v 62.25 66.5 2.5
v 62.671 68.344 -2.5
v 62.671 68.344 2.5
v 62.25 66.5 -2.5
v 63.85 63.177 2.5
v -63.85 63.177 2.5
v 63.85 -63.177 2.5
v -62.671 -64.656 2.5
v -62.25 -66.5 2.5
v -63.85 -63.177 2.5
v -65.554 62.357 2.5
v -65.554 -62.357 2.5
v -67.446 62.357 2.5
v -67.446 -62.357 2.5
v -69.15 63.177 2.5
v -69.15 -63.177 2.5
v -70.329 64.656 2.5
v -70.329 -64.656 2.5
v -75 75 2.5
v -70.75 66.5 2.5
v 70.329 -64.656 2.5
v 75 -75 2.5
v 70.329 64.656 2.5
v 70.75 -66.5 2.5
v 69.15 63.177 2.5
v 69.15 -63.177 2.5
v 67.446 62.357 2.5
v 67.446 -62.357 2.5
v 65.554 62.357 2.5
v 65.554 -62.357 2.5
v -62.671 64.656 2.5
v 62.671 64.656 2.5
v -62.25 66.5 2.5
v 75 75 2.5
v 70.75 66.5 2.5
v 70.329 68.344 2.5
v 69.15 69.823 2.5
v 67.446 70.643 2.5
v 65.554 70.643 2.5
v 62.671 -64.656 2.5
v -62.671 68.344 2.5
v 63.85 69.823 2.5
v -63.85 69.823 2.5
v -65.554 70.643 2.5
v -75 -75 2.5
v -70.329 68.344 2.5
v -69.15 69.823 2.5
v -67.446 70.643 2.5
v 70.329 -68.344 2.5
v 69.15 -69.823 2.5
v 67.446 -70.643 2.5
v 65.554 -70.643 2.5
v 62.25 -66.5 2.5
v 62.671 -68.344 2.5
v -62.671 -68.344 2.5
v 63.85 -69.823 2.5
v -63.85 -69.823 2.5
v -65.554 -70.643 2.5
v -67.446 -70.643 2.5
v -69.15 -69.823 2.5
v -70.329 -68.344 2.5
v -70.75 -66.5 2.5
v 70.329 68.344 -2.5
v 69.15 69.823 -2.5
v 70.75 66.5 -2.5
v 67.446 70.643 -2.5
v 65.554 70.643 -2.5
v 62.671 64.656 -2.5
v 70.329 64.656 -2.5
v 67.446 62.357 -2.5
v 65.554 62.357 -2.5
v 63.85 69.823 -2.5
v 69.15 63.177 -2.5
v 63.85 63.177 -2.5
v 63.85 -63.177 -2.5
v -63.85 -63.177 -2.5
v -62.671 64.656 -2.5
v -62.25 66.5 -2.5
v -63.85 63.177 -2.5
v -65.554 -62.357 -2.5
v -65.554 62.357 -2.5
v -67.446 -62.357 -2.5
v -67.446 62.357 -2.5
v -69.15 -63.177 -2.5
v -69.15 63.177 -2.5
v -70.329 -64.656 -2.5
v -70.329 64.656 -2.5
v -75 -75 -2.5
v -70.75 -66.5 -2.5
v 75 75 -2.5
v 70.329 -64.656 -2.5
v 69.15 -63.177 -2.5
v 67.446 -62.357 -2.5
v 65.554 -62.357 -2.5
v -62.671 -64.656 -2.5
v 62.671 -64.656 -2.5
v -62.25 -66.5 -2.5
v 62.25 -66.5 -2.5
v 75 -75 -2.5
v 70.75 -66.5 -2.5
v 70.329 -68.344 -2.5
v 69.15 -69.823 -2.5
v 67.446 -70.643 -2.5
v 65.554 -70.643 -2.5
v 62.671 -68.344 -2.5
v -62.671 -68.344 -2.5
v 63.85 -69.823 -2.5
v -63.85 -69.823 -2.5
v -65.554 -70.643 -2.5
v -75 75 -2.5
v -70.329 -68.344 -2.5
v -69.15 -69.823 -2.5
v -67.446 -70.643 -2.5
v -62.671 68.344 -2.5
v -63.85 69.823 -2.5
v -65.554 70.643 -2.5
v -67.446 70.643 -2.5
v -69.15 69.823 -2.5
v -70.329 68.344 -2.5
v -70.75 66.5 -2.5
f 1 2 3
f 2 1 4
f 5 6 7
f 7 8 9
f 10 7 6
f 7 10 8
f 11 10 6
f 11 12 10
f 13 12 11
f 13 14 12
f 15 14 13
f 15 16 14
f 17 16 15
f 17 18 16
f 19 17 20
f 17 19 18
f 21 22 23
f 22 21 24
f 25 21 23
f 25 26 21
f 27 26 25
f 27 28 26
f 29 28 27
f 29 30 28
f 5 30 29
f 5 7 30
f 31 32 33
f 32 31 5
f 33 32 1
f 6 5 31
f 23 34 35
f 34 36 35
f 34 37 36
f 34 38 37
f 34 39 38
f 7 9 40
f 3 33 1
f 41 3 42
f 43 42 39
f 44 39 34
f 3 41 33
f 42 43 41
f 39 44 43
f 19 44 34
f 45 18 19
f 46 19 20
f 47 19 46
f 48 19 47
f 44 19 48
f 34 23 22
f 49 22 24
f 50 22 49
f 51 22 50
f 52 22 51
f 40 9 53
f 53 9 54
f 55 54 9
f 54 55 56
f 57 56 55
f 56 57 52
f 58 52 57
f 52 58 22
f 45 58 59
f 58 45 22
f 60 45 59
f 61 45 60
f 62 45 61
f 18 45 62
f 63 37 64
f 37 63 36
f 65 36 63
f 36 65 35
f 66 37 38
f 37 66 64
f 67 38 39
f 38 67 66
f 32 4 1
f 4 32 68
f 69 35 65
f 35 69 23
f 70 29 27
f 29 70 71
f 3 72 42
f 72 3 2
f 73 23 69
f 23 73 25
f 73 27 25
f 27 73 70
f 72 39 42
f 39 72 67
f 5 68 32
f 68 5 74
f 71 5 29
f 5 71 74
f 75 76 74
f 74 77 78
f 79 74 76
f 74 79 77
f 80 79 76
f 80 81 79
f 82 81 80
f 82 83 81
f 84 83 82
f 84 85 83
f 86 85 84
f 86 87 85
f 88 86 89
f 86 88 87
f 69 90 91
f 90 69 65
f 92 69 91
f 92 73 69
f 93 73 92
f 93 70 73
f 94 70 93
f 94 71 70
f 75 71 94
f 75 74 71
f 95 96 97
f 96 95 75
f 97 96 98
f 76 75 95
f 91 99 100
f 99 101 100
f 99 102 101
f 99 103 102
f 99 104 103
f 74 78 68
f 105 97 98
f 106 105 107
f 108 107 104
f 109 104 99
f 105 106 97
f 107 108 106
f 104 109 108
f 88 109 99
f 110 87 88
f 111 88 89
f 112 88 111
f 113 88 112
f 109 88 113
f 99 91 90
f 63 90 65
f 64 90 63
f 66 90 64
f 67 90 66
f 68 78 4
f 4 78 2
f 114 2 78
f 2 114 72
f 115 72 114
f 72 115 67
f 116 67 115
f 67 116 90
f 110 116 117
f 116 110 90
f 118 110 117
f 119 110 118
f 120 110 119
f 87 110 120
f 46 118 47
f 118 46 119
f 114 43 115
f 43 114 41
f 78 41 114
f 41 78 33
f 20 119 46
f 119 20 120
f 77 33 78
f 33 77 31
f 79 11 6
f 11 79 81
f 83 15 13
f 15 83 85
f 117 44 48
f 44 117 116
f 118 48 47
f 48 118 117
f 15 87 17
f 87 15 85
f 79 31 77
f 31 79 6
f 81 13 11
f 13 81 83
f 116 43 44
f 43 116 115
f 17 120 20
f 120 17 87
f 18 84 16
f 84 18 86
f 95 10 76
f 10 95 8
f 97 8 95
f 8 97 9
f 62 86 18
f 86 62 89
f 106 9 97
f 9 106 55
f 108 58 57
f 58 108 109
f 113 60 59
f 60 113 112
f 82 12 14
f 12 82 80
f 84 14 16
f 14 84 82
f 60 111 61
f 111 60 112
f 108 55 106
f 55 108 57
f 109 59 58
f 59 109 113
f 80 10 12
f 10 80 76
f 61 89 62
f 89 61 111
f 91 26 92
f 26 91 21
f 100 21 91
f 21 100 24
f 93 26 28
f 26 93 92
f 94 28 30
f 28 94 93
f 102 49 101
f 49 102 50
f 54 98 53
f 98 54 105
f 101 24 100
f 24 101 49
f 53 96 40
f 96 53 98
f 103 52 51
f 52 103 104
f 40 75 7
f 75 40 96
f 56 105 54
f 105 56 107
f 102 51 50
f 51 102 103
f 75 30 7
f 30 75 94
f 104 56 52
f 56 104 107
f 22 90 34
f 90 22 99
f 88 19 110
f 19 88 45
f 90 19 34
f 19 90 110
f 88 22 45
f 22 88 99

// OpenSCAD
// Generated by SolidPython 1.1.3 on 2024-06-19 00:59:38


difference() {
	cube(center = true, size = [150, 150, 5]);
	union() {
		translate(v = [66.5000000000, 66.5000000000]) {
			cylinder(center = true, h = 5, r = 4.2500000000);
		}
		translate(v = [-66.5000000000, 66.5000000000]) {
			cylinder(center = true, h = 5, r = 4.2500000000);
		}
		translate(v = [-66.5000000000, -66.5000000000]) {
			cylinder(center = true, h = 5, r = 4.2500000000);
		}
		translate(v = [66.5000000000, -66.5000000000]) {
			cylinder(center = true, h = 5, r = 4.2500000000);
		}
	}
}
/***********************************************
*********      SolidPython code:      **********
************************************************
 
import solid
import numpy as np
import numbers
import pudb
from solid.utils import *
import viewscad
import subprocess
import os
import os.path as osp
import math
import sys

chamfer_extrude=solid.import_scad("./chamfer_extrude.scad")
chamfer_extrude=chamfer_extrude.chamfer_extrude
r = viewscad.Renderer(width=800, height=800)

def debug(model,f_name,path="/home/ts/code/projects/mfd/designs/debug"):
    solid.scad_render_to_file(model,osp.join(path,f_name)+".scad")
#generate position list of wells using offset from center
wells_pos_from_center_4 = lambda offset: [[-offset,offset],
                                        [offset, offset],
                                        [-offset, -offset],
                                        [offset, -offset]]
wells_pos_from_center_2 = lambda offset: [[offset,0],
                                        [-offset,0]]

def make_well(dims,shape=None,height=None,dxf=False):
    def circle_cylinder():
        if dxf or (height is None):
            well = solid.circle(r=dims, segments=64)
        else:
            well = solid.cylinder(r=dims, h=height, segments=64, center = True)
        return well
    if dims is None:
        sys.exit("radius needs to be a number")
    if isinstance(dims, numbers.Number):
        well =circle_cylinder()
    elif len(dims)==1:
        if isinstance(dims[1], numbers.Number):
            well =circle_cylinder()
        else:
            sys.exit("radius needs to be a number")
    elif len(dims)==2:
        well = solid.square(dims,center = True)
    elif len(dims)==3:
        well = solid.cube(dims, center = True)
    return well

def wells_top_bottom(center_gap,device_dims=None,shape=None,height=None, positions = None, dxf = False,well_shape=None):
    if well_shape == None:
        well_shape = make_well(device_dims,shape=shape,height=height,dxf=dxf)
    wells = []
    if positions is None:
        offset = radius+radius/2.0
        positions = wells_pos_from_center_2(offset)
    if dxf or (height is None):
        height = 0
    for position in positions:
        if dxf:
            wells.append(solid.translate([position[0],position[1]])(well_shape))
        else:
            wells.append(solid.translate([position[0],position[1],height/2.0])(well_shape))
    return  union()(*wells)

#place wells in four corners 
def four_corner(radius,height=None, positions = None, dxf = False):
    #if well pos not specified set
    #to equally spaced by half radius
    if positions is None:
        offset = radius+radius/2.0
        positions = wells_pos_from_center_4(offset)
    if dxf or (height is None):
        height = 0
    #make wells at positions with specified radius and height
    wells = []
    for position in positions:
        #make circle if making dxf
        if dxf:
            well_shape = solid.circle(r=radius, segments=64)
            well_shape = solid.translate([position[0],position[1]])(well_shape)
        #if stl make cylinder
        else:
            well_shape = solid.cylinder(r=radius, h=height, segments=64, center = True)
            well_shape = solid.translate([position[0],position[1],height/2.0])(well_shape)
        wells.append(well_shape)
    return  union()(*wells)

#generate channels 
def make_channels(length,width,height=0,num_chans=1,max_chans=None,spacing=None, dxf = False,
                  rotate_channels=False):
    if dxf or (height is None):
        height = 0
    #if channel gap not defined, is equal to
    if spacing is None: spacing = width
    #calculate number of channels if fitting max num within given width
    if not max_chans is None:
        import math
        num_chans = math.floor((max_chans-spacing)/(width+spacing))
    #get total width of channel section  
    total_width = (width*num_chans)+(spacing*(num_chans-1))

    #make template channel
    #if rotate_channels: width, length = length, width
    if dxf:
        channel_t = solid.square([length,width],center = True)
    else:
        channel_t = solid.cube([length,width,height], center = True)

    #if number channels is even, offset the first channel to center its gap
    if num_chans % 2 == 0: centering = -(width/2.0+spacing/2.0)
    else: centering = 0
    #move template channel up to align bottom at z = 0 
    #and offset center if necessary
    if dxf:
        channel_t = solid.translate([0,centering])(channel_t)
    else:
        channel_t = solid.translate([0,centering,height/2.0])(channel_t)

    #if rotate_channels: length,width = width,length
    #start making the channels
    channels = []
    for i in range(num_chans):
        #if i=0 there is no translation
        #if i=1, we make the first channel adjacent to second
        direction = i

        #if i>=1, we add channels alternating left and right
        if i >= 1:
            direction = -(i/2.0)
            if i % 2 == 1: direction = (-direction)+0.5
                
        #make channel at right position and add it to channel list
        translation_coords = [0,direction*(width+spacing)]
        #if rotate_channels: translation_coords = [direction*(width+spacing),0]
        if dxf:
            channel = solid.translate(translation_coords)(channel_t)
        else:
            channel = solid.translate([*translation_coords,0])(channel_t)
        channels.append(channel)
    
    #group all channels as one object
    channels = union()(*channels)
    #compute the x,y,z dimensions in order to pass as arguments 
    #for construction of other parts of device (such as the chambers)
    measurements = {'x':(length/2.0,-length/2.0),
                    'y':(total_width/2.0,-total_width/2.0)}
    if not dxf:
        measurements['z'] = (height,0)
    if rotate_channels:
        channels = solid.rotate(90)(channels)
        measurements['x'],measurements['y']=measurements['y'],measurements['x']
    return channels,measurements

def make_chambers(msrs,height=None,extra=0,len_until=None,width=None, dxf = False):
    #computes x,y,z length
    total = lambda x : abs(x[0]) + abs(x[1])
    
    #if specific height if specified
    #otherwise use same height as channels
    if dxf:
        pass
    elif not height is None:
        msrs['z'] = (height,0)
    else:
        msrs['z'] = (0,0)
        
    #make copy of measurements from channels to modify chamber dimensions 
    #and add length to chambers as specified
    chamber_dims = msrs.copy()
    #calculate length of chamber to reach specified offset
    if not len_until is None:
        chamber_len = len_until-(msrs['x'][0])
    #or add specified length to channel length (if not specified, adds 0)
    else:
        chamber_len = msrs['x'][0]+extra
    #set the chamber length based 
    chamber_dims['x'] = (chamber_len/2.0,-(chamber_len/2.0))
    #compute final dimensions of chamber
    if not width is None:
        chamber_dims['y'] = (width/2.0,-width/2.0)
    chamber_dims = [total(size) for size in chamber_dims.values()]
        
    #calculate chamber translation offset to place adjacent to channels
    chamber_trslt = msrs['x'][0]+(chamber_len/2.0)
    #compute chamber translation coordinates to align with channels
    #x = 1 moves chamber above channels
    #x = -1 moves chamber below channels
    if dxf:
        trslt = lambda x : [x*(chamber_trslt),0]
    else:
        trslt = lambda x : [x*(chamber_trslt),0,msrs['z'][0]/2.0]
    
    #function to make chamber at top or at bottom 
    if dxf:
        move = lambda x : solid.translate(trslt(x))(solid.square(chamber_dims, center = True) )
    else:
        move = lambda x : solid.translate(trslt(x))(solid.cube(chamber_dims,center = True))
    #make top and bottom chambers and return them as grouped
    top = move(1)
    bottom = move(-1)
    #chambers=solid.rotate(90)(solid.union()(top,bottom))
    chambers=(solid.union()(top,bottom))

    return chambers

#create alignment features 
def alignment_features(unit,dims,grid_size, mask_size = None, alignment = "hollow", units_from_center = (2.5,2.5), corner_len=None):
    width = grid_size[0]*dims[0]
    length = grid_size[1]*dims[1]
    if mask_size is None and corner_len is None:
        corner_len = (dims[0] + dims[1]) /2 / 8
    corner = lambda thickness_div : solid.union()( solid.square([corner_len,corner_len/thickness_div],center=False), solid.square([corner_len/thickness_div,corner_len],center=False) )
    
    def make_full(thickness_div):
        thickness = corner_len/thickness_div
        tr = solid.translate([0, 0, 0 ])(solid.rotate(180)(corner(thickness_div)))
        tr = solid.translate([thickness/2,thickness/2,0])(tr)
        bl = solid.translate([0, 0, 0 ])(solid.rotate(0)(corner(thickness_div)))
        bl = solid.translate([-thickness/2,-thickness/2,0])(bl)
        return solid.union()(tr,bl)
    
    def make_hollow(thickness_div):
        thickness = corner_len/(thickness_div/2)
        inner = make_full(thickness_div)
        outer = make_full(thickness_div/2)
        hollow = outer - inner 
        return hollow
    
    center = (width /2 , length/2)
    mask_pos = lambda x,y : (center[0] + x*(float(units_from_center[0])*dims[0]), center[1] + y*(float(units_from_center[1])*dims[1]))
    positions = []
    positions.append(mask_pos(1,0))
    positions.append(mask_pos(0,1))
    positions.append(mask_pos(-1,0))
    positions.append(mask_pos(0,-1))
    make_mask = lambda mtype : make_hollow(8) if mtype == "hollow" else make_full(8)
    masks = [ solid.translate([*position,0])(make_mask(alignment)) for position in positions]
    
    solid.scad_render_to_file(solid.union()(*masks),"./designs/open_chamber/masks.scad")
    #return unit - solid.union()(*masks)
    return solid.union()(*masks,unit)

def create_outline(thickness, array, dims, grid_size,):
    width = grid_size[0]*dims[0] + thickness *2
    length = grid_size[1]*dims[1] + thickness *2
    outer = solid.translate([-thickness, -thickness,0])(solid.square([width, length]))
    return outer-array

def create_wall(wall_thickness, outline_thickness, dims, grid_size, wall_height = 2000, dxf = False):
    inner_width = grid_size[0]*dims[0] + outline_thickness *2
    inner_length = grid_size[1]*dims[1] + outline_thickness *2
    outer_width = inner_width + wall_thickness * 2
    outer_length = inner_length + wall_thickness * 2
    outer_pos_x = -outline_thickness-wall_thickness
    outer_pos_y = -outline_thickness-wall_thickness
    inner_pos_x = -outline_thickness
    inner_pos_y = -outline_thickness
    if dxf:
        inner_wall = solid.translate([inner_pos_x,
                                      inner_pos_y,
                                      0])(solid.square([inner_width, inner_length]))
        outer_wall = solid.translate([outer_pos_x,
                                      outer_pos_y,
                                      0])(solid.square([outer_width, outer_length]))

        return outer_wall-inner_wall
    else:
        inner_wall = solid.translate([inner_pos_x,
                                      inner_pos_y,
                                      0])(solid.cube([inner_width, inner_length,wall_height]))
        outer_wall = solid.translate([outer_pos_x,
                                      outer_pos_y,
                                      0])(solid.cube([outer_width, outer_length,wall_height]))

        return outer_wall-inner_wall, {'wall_height': wall_height,
                                       'wall_thickness': wall_thickness,
                                       'inner_width':inner_width,
                                       'inner_length': inner_length,
                                       'outer_width': outer_width,
                                       'outer_length': outer_length,
                                       'outer_pos_x' : outer_pos_x,
                                       'outer_pos_y' : outer_pos_y,
                                       'inner_pos_x' : inner_pos_x,
                                       'inner_pos_y' : inner_pos_y}

def create_thicker_wall(wall_thickness, outer_wall_offset, wall_dims, dims, grid_size, height_start = .2, height_end=2, dxf = False):
    addon_wall,thicker_wall_dims = create_wall(wall_thickness, outer_wall_offset, dims, grid_size, wall_height=height_end-height_start, dxf = False)
    addon_wall = solid.translate([0,0,height_start])(addon_wall)

    thicker_wall_dims['wall_height'] = height_end
    thicker_wall_dims['wall_thickness'] = wall_dims['wall_thickness'] + wall_thickness
    return addon_wall, thicker_wall_dims
 
def add_lock_to_wall(wall,wall_dims,y_offset = 0,cut_ratio=0.7,L_length=3, gap_ratio=0.05, axis="x",width_ratio=1/2):
    # Makes L shape
    def make_L(max_length,length_thickness,max_width,width_thickness,height,y_offset):
        length = solid.cube([max_length,length_thickness,height])
        width = solid.cube([width_thickness,max_width,height])
        width = solid.translate([max_length-(width_thickness),0,0])(width)
        L = solid.union()(width,length)
        debug(L,"L")
        if axis == "x":
            L = solid.rotate(-90)(L)
            L = solid.translate([0,max_length,0])(L)
        else:
            L = solid.rotate(-180)(L)
            L = solid.translate([max_length,max_width,0])(L)
        return solid.translate([0,0,y_offset])(L)
    
    lock_length = L_length
    lock_width = wall_dims['wall_thickness']*width_ratio
    lock_length_thickness = lock_width/2
    lock_width_thickness = lock_width/2
    L_lock = make_L(lock_length,lock_length_thickness,lock_width,lock_width_thickness, wall_dims['wall_height']-y_offset, y_offset)
    
    margin_space = lock_length - lock_length*(1-gap_ratio)
    key_length = lock_length-margin_space
    key_length_thickness = lock_length_thickness-(margin_space*2)
    key_width = lock_width-(margin_space*2)
    key_width_thickness = lock_width_thickness-(margin_space*2)
    L_key = make_L(key_length,key_length_thickness,key_width,key_width_thickness, wall_dims['wall_height']-y_offset, y_offset)
    L_key = solid.translate([margin_space,margin_space,0])(L_key)
    L = solid.union()(L_lock,L_key)
    debug(L,"L")
    
    #Make cube to be used as negative to split frame in a half
    #Can choose if making left or right negative, specify ratio of split
    def make_negative(right,cut_ratio):
        if axis == "x":
            if right:
                length = wall_dims['outer_length']*(1-cut_ratio)
                pos_x = wall_dims['outer_pos_x']+(wall_dims['outer_length']*cut_ratio)
            else:
                length = wall_dims['outer_length']*(cut_ratio)
                pos_x = wall_dims['outer_pos_x'] 
            negative = solid.cube([wall_dims['outer_width'],length, wall_dims['wall_height']])
            negative = solid.translate([wall_dims['outer_pos_y'],pos_x,0])(negative)
        else:
            if right:
                length = wall_dims['outer_width']*(1-cut_ratio)
                pos_x = wall_dims['outer_pos_y']+(wall_dims['outer_width']*cut_ratio)
            else:
                length = wall_dims['outer_width']*(cut_ratio)
                pos_x = wall_dims['outer_pos_y'] 
            negative = solid.cube([length,wall_dims['outer_length'], wall_dims['wall_height']])
            negative = solid.translate([pos_x,wall_dims['outer_pos_x'],0])(negative)
        return negative, pos_x, length 
                      
    #Make negatives
    negative_right, right_half_pos_x, right_half_length = make_negative(True,cut_ratio)
    negative_left, left_half_pos_x, right_half_length = make_negative(False,cut_ratio)
    #Make halves
    left_half = solid.difference()(wall,negative_right)
    right_half = solid.difference()(wall,negative_left)
    def place_L(L, L_length,L_width):
        #Place L on top wall       
        offset_to_center = (wall_dims['wall_thickness']-L_width)/2
        if axis == "x":
            y_pos_top = (wall_dims['outer_pos_y'] +
                    wall_dims['outer_width'] - 
                    L_width - offset_to_center)
            top_L = solid.translate([y_pos_top,
                                     right_half_pos_x-(L_length),
                                     0])(L)
            #Place L on bottom wall       
            y_pos_bottom = wall_dims['outer_pos_y']+offset_to_center
            bottom_L = solid.translate([y_pos_bottom,
                                        right_half_pos_x-L_length,
                                        0])(L)
        else:
            y_pos_top = (wall_dims['outer_pos_x'] +
                    wall_dims['outer_length'] -
                    (L_width+offset_to_center))
            top_L = solid.translate([right_half_pos_x-L_length,
                                     y_pos_top,
                                     0])(L)
            #Place L on bottom wall       
            y_pos_bottom = wall_dims['outer_pos_y']+offset_to_center
            bottom_L = solid.translate([right_half_pos_x-L_length,
                                        y_pos_bottom,
                                        0])(L)
        return bottom_L, top_L
    #Make complimentary L pieces through union and differences
    #Make Lock
    bottom_L_lock, top_L_lock = place_L(L_lock,L_length,lock_width)
    left_half = solid.difference()(left_half,bottom_L_lock)
    left_half = solid.difference()(left_half,top_L_lock)
    #Make Key
    bottom_L_key, top_L_key = place_L(L_key,L_length,lock_width)
    right_half = solid.union()(right_half,bottom_L_key)
    right_half = solid.union()(right_half,top_L_key)
    return left_half, right_half


#build a row x col grid of containment units
def make_unit_array(unit,dims,grid_size, dxf = False, alignment = None, mask_size = None,
                    units_from_center = None,alignment_offset=None, alignment_mark_size=1):
    units = []
    for col in range(grid_size[1]):
        for row in range(grid_size[0]):
            if dxf:
                units.append(solid.translate([row*dims[0],col*dims[1]])(unit))
            else:
                units.append(solid.translate([row*dims[0],col*dims[1],dims[2]/2.0])(unit))
    array = solid.union()(*units)
    if (not alignment is None) and dxf:
        if not alignment_offset is None:
            array = solid.translate([alignment_offset[0],alignment_offset[1]])(array)
        array = alignment_features(array,dims, grid_size, alignment = alignment, mask_size = None, units_from_center = units_from_center,corner_len=alignment_mark_size)
        if not alignment_offset is None:
            array = solid.translate([-alignment_offset[0],-alignment_offset[1]])(array)
    return array


def make_taylor(wells_pos = wells_pos_from_center_4(2.25), well_rad = 1.5 ,
                well_height = 2, chan_w = 0.01, chan_l = 1, chan_h = 0.010 ,
                chan_gap = 0.040, max_chans = None,num_chans=100, chamber_height  = 0.100,
                columns = 1, rows = 1, chamber_len_until=2.25, add_channels = True, add_wells = True, 
                add_chambers = True, save_path = "./", alignment = None, units_from_center = 2,
                mask_size = None, render_stl = False, outline_thickness = 0.050, dxf = True,
                wall_height = 15, wall_thickness = 0.95, casing_x=9, casing_y=9, casing_z=0,rotate_units=0):

    dims = [casing_x, casing_y, casing_z]
    wells = four_corner(well_rad,well_height, dxf = dxf, positions = wells_pos)
    debug(wells,"wells")
    channels, msrs = make_channels(chan_l,chan_w,chan_h,dxf=dxf, spacing = chan_gap, max_chans=max_chans,num_chans=num_chans)
    debug(channels,"channels")
    chambers = make_chambers(msrs,dxf = dxf, height=chamber_height,len_until=chamber_len_until)
    debug(chambers,"chambers")

    #add together and render
    device_parts = []
    if add_channels:
        device_parts.append(channels)
    if add_wells:
        device_parts.append(wells)
    if add_chambers:
        device_parts.append(chambers)
    device=union()(*device_parts)
    device = rotate(rotate_units)(device)

    device=solid.translate([dims[0]/2.0,dims[1]/2.0,0])(device)
    channels = rotate(rotate_units)(channels)
    channels=solid.translate([dims[0]/2,dims[1]/2,0])(channels)
    chambers_wells = union()(wells,chambers)
    chambers_wells = rotate(rotate_units)(chambers_wells)
    chambers_wells=solid.translate([dims[0]/2,dims[1]/2,0])(chambers_wells)

    file_name = str(rows)+'x'+str(columns)+'_units_'
    grid_size = [rows,columns]

    if alignment:
        alignment="full"
    device = make_unit_array(device,dims,grid_size, dxf=dxf, alignment = alignment,
                                 units_from_center = units_from_center)
    channels = make_unit_array(channels,dims,grid_size, dxf=dxf, alignment = alignment,
                                 units_from_center = units_from_center)
    if alignment=="full":
        alignment="hollow"

    chambers_wells = make_unit_array(chambers_wells,dims,grid_size, dxf=dxf, alignment = alignment,
                                 units_from_center =units_from_center)

    def save_model(model,prefix):
        model_fname = os.path.abspath(save_path+prefix+"_"+file_name+".scad")
        solid.scad_render_to_file(model,model_fname)
        return model_fname

    wells_fname = save_model(wells,"wells")
    channels_fname = save_model(channels,"channels")
    device_fname = save_model(device,"device")
    chambers_wells_fname = save_model(chambers_wells,"chambers_wells")
    return (chambers_wells,chambers_wells_fname), (channels,channels_fname), (device,device_fname)

def make_device(design='open',rows=8,columns=6,wells_pos = 4.5,well_offset=3.2, well_rad=3.2,well_height=0.1,
                chan_l=1,chan_w=0.01,chan_h=0.01,chan_gap=0.015,num_chans=101,dxf=True,save_path="./designs/open_chamber/",
                casing_x=9.0,casing_y=18.0,casing_z=0,rotate_units=90,units_from_center=(3,1),chamber_len_until=4.5,
                chamber_width=None,alignment=True, add_wells=True, add_channels=True,add_chambers=True,well_shape=None):

    dims = [casing_x, casing_y, casing_z]
    if design == "open":
        wells_pos=wells_pos_from_center_2(wells_pos)
        wells = wells_top_bottom(well_offset*2,device_dims=well_rad,height=well_height, dxf = dxf, positions = wells_pos,well_shape=well_shape)
    elif design == "closed":
        wells_pos=wells_pos_from_center_4(wells_pos)
        debug(wells,"wells")
        wells = four_corner(well_offset,well_height,device_dims=well_rad, dxf = dxf, positions = wells_pos)
    else:
        print(design+" is not a valid design.\n Choose valid design: 'open' or 'closed'")
        exit()
    wells = rotate(rotate_units)(wells)
    wells=solid.translate([dims[0]/2,dims[1]/2,0])(wells)
    debug(wells,"wells")

    channels, msrs = make_channels(chan_l,chan_w,chan_h,dxf=dxf, spacing = chan_gap, num_chans=num_chans,rotate_channels=False)
    channels = rotate(rotate_units)(channels)
    channels=solid.translate([dims[0]/2,dims[1]/2,0])(channels)

    chambers=make_chambers(msrs,height=None,extra=0,len_until=chamber_len_until, width=chamber_width,dxf = dxf)
    chambers = rotate(rotate_units)(chambers)
    chambers=solid.translate([dims[0]/2,dims[1]/2,0])(chambers)

    device_parts = []
    if add_channels:
        device_parts.append(channels)
    if add_wells:
        device_parts.append(wells)
    if add_chambers:
        device_parts.append(chambers)
    device = union()(*device_parts)
    #device = rotate(rotate_units)(device)
    #device=solid.translate([dims[0]/2.0,dims[1]/2.0,0])(device)

    chambers_wells = []
    if add_chambers:
        chambers_wells.append(chambers)
    if add_wells:
        chambers_wells.append(wells)
    chambers_wells = union()(*chambers_wells)
    #chambers_wells = union()(wells,chambers)
    #chambers_wells = rotate(rotate_units)(chambers_wells)
    #chambers_wells=solid.translate([dims[0]/2,dims[1]/2,0])(chambers_wells)

    file_name = str(rows)+'x'+str(columns)+'_units_'

    grid_size = [rows,columns]
    if alignment:
        alignment="full"
    device = make_unit_array(device,dims,grid_size, dxf=dxf, alignment = alignment,
                                 units_from_center = units_from_center)
    channels = make_unit_array(channels,dims,grid_size, dxf=dxf, alignment = alignment,
                                 units_from_center = units_from_center)
    if alignment=="full":
        alignment="hollow"

    chambers_wells = make_unit_array(chambers_wells,dims,grid_size, dxf=dxf, alignment = alignment,
                                 units_from_center =units_from_center)

    def save_model(model,prefix):
        model_fname = os.path.abspath(save_path+prefix+"_"+file_name+".scad")
        solid.scad_render_to_file(model,model_fname)
        return model_fname

    wells_fname = save_model(wells,"wells")
    channels_fname = save_model(channels,"channels")
    device_fname = save_model(device,"device")
    chambers_wells_fname = save_model(chambers_wells,"chambers_wells")
    return (chambers_wells,chambers_wells_fname), (channels,channels_fname), (device,device_fname)


def make_open_chamber(rows=8,columns=6,wells_pos = wells_pos_from_center_2(4.5), well_rad=3.2,well_height=0.1,
                      chan_l=1,chan_w=0.01,chan_h=0.01,chan_gap=0.015,num_chans=101,dxf=True,save_path="./designs/open_chamber/",
                      casing_x=9.0,casing_y=18.0,casing_z=0,rotate_units=90,units_from_center=(3,1),chamber_len_until=4.5,
                      chamber_width=None,alignment=True, add_wells=True, add_channels=True,add_chambers=True,well_shape=None):

    dims = [casing_x, casing_y, casing_z]
    wells = wells_top_bottom(well_rad,height=well_height, dxf = dxf, positions = wells_pos, well_shape=well_shape)
    channels, msrs = make_channels(chan_l,chan_w,chan_h,dxf=dxf, spacing = chan_gap, num_chans=num_chans,rotate_channels=False)
    chambers=make_chambers(msrs,height=None,extra=0,len_until=chamber_len_until, width=chamber_width,dxf = dxf)
    debug(chambers,"chambers")
    device_parts = []
    if add_channels:
        device_parts.append(channels)
    if add_wells:
        device_parts.append(wells)
    if add_chambers:
        device_parts.append(chambers)
    device = union()(*device_parts)
    device = rotate(rotate_units)(device)
    device=solid.translate([dims[0]/2.0,dims[1]/2.0,0])(device)
    channels = rotate(rotate_units)(channels)
    channels=solid.translate([dims[0]/2,dims[1]/2,0])(channels)
    chambers_wells = union()(wells,chambers)
    chambers_wells = rotate(rotate_units)(chambers_wells)
    chambers_wells=solid.translate([dims[0]/2,dims[1]/2,0])(chambers_wells)

    file_name = str(rows)+'x'+str(columns)+'_units_'

    grid_size = [rows,columns]
    if alignment:
        alignment="full"
    device = make_unit_array(device,dims,grid_size, dxf=dxf, alignment = alignment,
                                 units_from_center = units_from_center)
    channels = make_unit_array(channels,dims,grid_size, dxf=dxf, alignment = alignment,
                                 units_from_center = units_from_center)
    if alignment=="full":
        alignment="hollow"

    chambers_wells = make_unit_array(chambers_wells,dims,grid_size, dxf=dxf, alignment = alignment,
                                 units_from_center =units_from_center)

    def save_model(model,prefix):
        model_fname = os.path.abspath(save_path+prefix+"_"+file_name+".scad")
        solid.scad_render_to_file(model,model_fname)
        return model_fname

    wells_fname = save_model(wells,"wells")
    channels_fname = save_model(channels,"channels")
    device_fname = save_model(device,"device")
    chambers_wells_fname = save_model(chambers_wells,"chambers_wells")
    return (chambers_wells,chambers_wells_fname), (channels,channels_fname), (device,device_fname)

def to_dxf(scad_path):
    dxf_path = scad_path.replace(".scad",".dxf")
    subprocess.call(["openscad", "-o", dxf_path, scad_path])
    import ezdxf
    temp_dxf = ezdxf.readfile(dxf_path)
    temp_dxf.saveas(dxf_path)

#def make_walls(diameter,thickness,grid_size,dims,height=20,segments=256,make_inner=True):
#    wafer_wall_out = solid.cylinder(r=diameter/2,h=height, segments=segments)
#    wafer_wall_in = solid.cylinder(r=(diameter/2-thickness),h=height, segments=segments)
#    wafer_wall = solid.difference()(wafer_wall_out,wafer_wall_in)
#    wafer_wall = solid.translate([grid_size[1]*dims[1]/2.0,grid_size[0]*dims[0]/2.0])(wafer_wall)
#
#    vertical_wall_length = grid_size[1]*dims[1]
#    horizontal_wall_length = grid_size[0]*dims[0]
#    vertical_wall = solid.cube([vertical_wall_length,thickness,height],center = True)
#    vertical_wall = solid.translate([vertical_wall_length/2,0,height/2])(vertical_wall)
#    horizontal_wall = solid.cube([thickness,horizontal_wall_length,height],center = True)
#    horizontal_wall = solid.translate([0,vertical_wall_length/2,height/2])(horizontal_wall)
#    walls = []
#    walls.append(horizontal_wall)
#    walls.append(vertical_wall)
#    for col in range(grid_size[1]):
#        if col == grid_size[1]-1: 
#            walls.append(solid.translate([0,(col+1)*dims[1]])(vertical_wall))
#        elif col > 0 and col < grid_size[1]-1 and make_inner==True:
#            walls.append(solid.translate([0,(col+1)*dims[1]])(vertical_wall))
#    for row in range(grid_size[0]):
#        if row == grid_size[0]-1: 
#            walls.append(solid.translate([(row+1)*dims[0],0])(horizontal_wall))
#        elif row > 0 and row < grid_size[0]-1 and make_inner==True:
#            walls.append(solid.translate([(row+1)*dims[0],0])(horizontal_wall))
#    walls = union()(*walls)
#    wafer_walls = union()(walls,wafer_wall)
#    return walls,wafer_wall,wafer_walls

def make_walls(diameter,thickness,grid_size,dims,height=20,segments=256,make_inner=True,padx=0,pady=0):
    wafer_wall_out = solid.cylinder(r=diameter/2,h=height, segments=segments)
    wafer_wall_in = solid.cylinder(r=(diameter/2-thickness),h=height, segments=segments)
    wafer_wall = solid.difference()(wafer_wall_out,wafer_wall_in)
    wafer_wall = solid.translate([grid_size[1]*dims[1]/2.0,grid_size[0]*dims[0]/2.0])(wafer_wall)

    vertical_wall_length = grid_size[0]*dims[0]+padx
    horizontal_wall_length = grid_size[1]*dims[1]+pady
    vertical_wall = solid.cube([vertical_wall_length,thickness,height],center = True)
    vertical_wall = solid.translate([vertical_wall_length/2-pady/2,-padx/2,height/2])(vertical_wall)
    horizontal_wall = solid.cube([thickness,horizontal_wall_length,height],center = True)
    horizontal_wall = solid.translate([-pady/2,horizontal_wall_length/2-padx/2,height/2])(horizontal_wall)
    walls = []
    walls.append(horizontal_wall)
    walls.append(vertical_wall)
    for col in range(grid_size[1]):
        if col == grid_size[1]-1: 
            walls.append(solid.translate([0,(col+1)*dims[1]+pady])(vertical_wall))
        elif col > 0 and col < grid_size[1]-1 and make_inner==True:
            walls.append(solid.translate([0,(col+1)*dims[1]])(vertical_wall))
    for row in range(grid_size[0]):
        if row == grid_size[0]-1: 
            walls.append(solid.translate([(row+1)*dims[0]+padx,0])(horizontal_wall))
        elif row > 0 and row < grid_size[0]-1 and make_inner==True:
            walls.append(solid.translate([(row+1)*dims[0],0])(horizontal_wall))
    walls = union()(*walls)
    wafer_walls = union()(walls,wafer_wall)
    return walls,wafer_wall,wafer_walls

def save_model(model,base_path,base_name,dxf=True):
    if not os.path.exists(base_path):
        os.makedirs(base_path)
    dxf_path=osp.join(base_path,base_name+".scad")
    solid.scad_render_to_file(model,osp.join(dxf_path))
    if dxf:
        to_dxf(dxf_path)

def make_wafer(diameter,flat_len,thickness):
    wafer = solid.cylinder(r1=diameter/2,r2=diameter/2,h=thickness,segments=512,)()
    x_start_flat=(flat_len/2)
    y_start_flat = math.sqrt(((diameter/2)**2) - (x_start_flat**2) )
    height_delete_flat=diameter/2-y_start_flat
    flat_delete = solid.cube([flat_len,height_delete_flat,thickness],center=False)()
    flat_delete = solid.translate([-flat_len/2,y_start_flat,0])(flat_delete)
    wafer = solid.difference()(wafer,flat_delete)
    wafer = solid.rotate(90)(wafer)
    return wafer

def add_wafer_to_mask(wafer_size,flat_len,mask,grid_size,dims,wafer_line_thickness=0.1,outer_mask_thickness=5,alignment_offset=None):
    def make_wafer_mask(wafer_size,flat_len):
        wafer_mask = make_wafer(wafer_size,flat_len,1)
        wafer_mask = solid.projection()(wafer_mask)
        wafer_mask = solid.translate([grid_size[0]*dims[0]/2.0,grid_size[1]*dims[1]/2.0])(wafer_mask)
        if not alignment_offset is None:
            wafer_mask = solid.translate([-alignment_offset[0],-alignment_offset[1]])(wafer_mask)
        return wafer_mask

    inner_wafer_line_mask = make_wafer_mask(wafer_size-wafer_line_thickness/2,flat_len)
    outer_wafer_line_mask = make_wafer_mask(wafer_size+wafer_line_thickness/2,flat_len)
    outer_wafer_mask = make_wafer_mask(wafer_size+outer_mask_thickness,flat_len)
    outer_wafer_mask = solid.difference()(outer_wafer_mask,outer_wafer_line_mask)
    wafer_mask = solid.union()(outer_wafer_mask,inner_wafer_line_mask)

    return solid.difference()(wafer_mask,mask)

def make_posts(post_shape,post_height):
    posts = solid.linear_extrude(height=post_height)(post_shape)
    return posts

def make_wafer_empty(diameter,flat_len,thickness,margin,notch_len=20,notch_height=5,oversize=1.01):
    diameter*=oversize
    flat_len*=oversize
    wafer = make_wafer(diameter,flat_len,thickness)
    holder = solid.cylinder(r1=diameter/2+margin,r2=diameter/2+margin,h=thickness,segments=512)()
    holder = solid.difference()(holder,wafer)

    x_start_flat=(flat_len/2)
    y_start_flat = math.sqrt(((diameter/2)**2) - (x_start_flat**2) )
    height_delete_flat=diameter/2-y_start_flat
    notch = solid.cube([notch_len,notch_height,thickness],center=False)()
    notch = solid.translate([-notch_len/2,y_start_flat,0])(notch)
    notch = solid.rotate(90)(notch)
    return solid.difference()(holder,notch)

def wafer_print_calibration(diameter,thickness,height,z_offset):
    circles = []
    radii = []
    radii.append(diameter/2.0*0.8)
    radii.append(diameter/2.0*0.6)
    radii.append(diameter/2.0*0.4)
    radii.append(diameter/2.0*0.2)
    for radius in radii:
        inner = solid.cylinder(r1=radius-(thickness/2.0),r2=radius-(thickness/2.0),h=thickness,segments=512,)()
        outer = solid.cylinder(r1=radius+(thickness/2.0),r2=radius+(thickness/2.0),h=thickness,segments=512,)()
        diff = solid.difference()(outer,inner)
        circles.append(diff)
    circles = solid.union()(*circles)
    circles = solid.translate([0,0,z_offset])(circles)
    return circles

def make_rack(wells,dims,grid_size,alignment_offset,rack_x,rack_y,rack_thickness,bolt_width,add_bolts=True):

    #get X and Y dimensions of gride of pipette tips
    X_len = dims[0]*grid_size[0]
    Y_len = dims[1]*grid_size[1]
    #make rack
    rack = solid.cube([rack_x,rack_y,rack_thickness],center=True)

    if add_bolts:
    #add bolt holes
        bolt_hole=solid.cylinder(r=bolt_width/2,h=rack_thickness,center=True)()
        bolt_holes = []
        bolt_holes.append(solid.translate([rack_x/2-1.5*bolt_width,rack_y/2-1.5*bolt_width])(bolt_hole))
        bolt_holes.append(solid.translate([-rack_x/2+1.5*bolt_width,rack_y/2-1.5*bolt_width])(bolt_hole))
        bolt_holes.append(solid.translate([-rack_x/2+1.5*bolt_width,-rack_y/2+1.5*bolt_width])(bolt_hole))
        bolt_holes.append(solid.translate([rack_x/2-1.5*bolt_width,-rack_y/2+1.5*bolt_width])(bolt_hole))
        bolt_holes = solid.union()(*bolt_holes)
        rack=solid.difference()(rack,bolt_holes)
    rack_support = rack

    #center rack with pipette holes
    rack = solid.translate([0,0,rack_thickness/2])(rack)
    rack = solid.translate([X_len/2,Y_len/2])(rack)
    rack = solid.translate([-alignment_offset[0],-alignment_offset[1]])(rack)
    wells = solid.linear_extrude(height=rack_thickness)(wells)
    rack = solid.difference()(rack,wells)
    return rack, rack_support

def make_pillar(wells,dims,grid_size,alignment_offset,rack_x,rack_y,pillar_height,rack_thickness,bolt_width,add_bolts=True,taper_angle=1,bolt_position_corner=1.5):

    #get X and Y dimensions of gride of pipette tips
    X_len = dims[0]*grid_size[0]
    Y_len = dims[1]*grid_size[1]
    #make rack
    rack = solid.cube([rack_x,rack_y,rack_thickness],center=True)
    
    if add_bolts:
    #add bolt holes
        bolt_hole=solid.cylinder(r=bolt_width/2,h=rack_thickness,center=True)()
        bolt_holes = []
        bolt_holes.append(solid.translate([rack_x/2-bolt_position_corner*bolt_width,rack_y/2-bolt_position_corner*bolt_width])(bolt_hole))
        bolt_holes.append(solid.translate([-rack_x/2+bolt_position_corner*bolt_width,rack_y/2-bolt_position_corner*bolt_width])(bolt_hole))
        bolt_holes.append(solid.translate([-rack_x/2+bolt_position_corner*bolt_width,-rack_y/2+bolt_position_corner*bolt_width])(bolt_hole))
        bolt_holes.append(solid.translate([rack_x/2-bolt_position_corner*bolt_width,-rack_y/2+bolt_position_corner*bolt_width])(bolt_hole))
        bolt_holes = solid.union()(*bolt_holes)
        rack=solid.difference()(rack,bolt_holes)
    rack_support = rack

    #center rack with pipette holes
    #rack = solid.translate([0,0,-rack_thickness])(rack)
    rack = solid.translate([X_len/2,Y_len/2])(rack)
    rack = solid.translate([-alignment_offset[0],-alignment_offset[1]])(rack)
    if not taper_angle == 0:
        wells=chamfer_extrude(pillar_height,taper_angle,segments=20)(wells)
    else:
        wells = solid.linear_extrude(height=pillar_height)(wells)
    rack = solid.union()(rack,wells)
    return rack, rack_support

def deg_taper_len(height,deg):
    if not deg == 0:
        return height*math.tan(math.radians(deg))
    else:
        return 0

def make_outline(inner_dims,wall_thickness,grid_size,dims,alignment_offset):
    inner_dims=np.array(inner_dims)
    inner_outline=solid.square(inner_dims,center=True)
    outer_dims=inner_dims+wall_thickness
    outer_outline=solid.square(outer_dims,center=True)
    outline=solid.difference()(outer_outline,inner_outline)
    outline=solid.translate([grid_size[0]*dims[0]/2.0,grid_size[1]*dims[1]/2.0])(outline)
    return outline








 
 
************************************************/
